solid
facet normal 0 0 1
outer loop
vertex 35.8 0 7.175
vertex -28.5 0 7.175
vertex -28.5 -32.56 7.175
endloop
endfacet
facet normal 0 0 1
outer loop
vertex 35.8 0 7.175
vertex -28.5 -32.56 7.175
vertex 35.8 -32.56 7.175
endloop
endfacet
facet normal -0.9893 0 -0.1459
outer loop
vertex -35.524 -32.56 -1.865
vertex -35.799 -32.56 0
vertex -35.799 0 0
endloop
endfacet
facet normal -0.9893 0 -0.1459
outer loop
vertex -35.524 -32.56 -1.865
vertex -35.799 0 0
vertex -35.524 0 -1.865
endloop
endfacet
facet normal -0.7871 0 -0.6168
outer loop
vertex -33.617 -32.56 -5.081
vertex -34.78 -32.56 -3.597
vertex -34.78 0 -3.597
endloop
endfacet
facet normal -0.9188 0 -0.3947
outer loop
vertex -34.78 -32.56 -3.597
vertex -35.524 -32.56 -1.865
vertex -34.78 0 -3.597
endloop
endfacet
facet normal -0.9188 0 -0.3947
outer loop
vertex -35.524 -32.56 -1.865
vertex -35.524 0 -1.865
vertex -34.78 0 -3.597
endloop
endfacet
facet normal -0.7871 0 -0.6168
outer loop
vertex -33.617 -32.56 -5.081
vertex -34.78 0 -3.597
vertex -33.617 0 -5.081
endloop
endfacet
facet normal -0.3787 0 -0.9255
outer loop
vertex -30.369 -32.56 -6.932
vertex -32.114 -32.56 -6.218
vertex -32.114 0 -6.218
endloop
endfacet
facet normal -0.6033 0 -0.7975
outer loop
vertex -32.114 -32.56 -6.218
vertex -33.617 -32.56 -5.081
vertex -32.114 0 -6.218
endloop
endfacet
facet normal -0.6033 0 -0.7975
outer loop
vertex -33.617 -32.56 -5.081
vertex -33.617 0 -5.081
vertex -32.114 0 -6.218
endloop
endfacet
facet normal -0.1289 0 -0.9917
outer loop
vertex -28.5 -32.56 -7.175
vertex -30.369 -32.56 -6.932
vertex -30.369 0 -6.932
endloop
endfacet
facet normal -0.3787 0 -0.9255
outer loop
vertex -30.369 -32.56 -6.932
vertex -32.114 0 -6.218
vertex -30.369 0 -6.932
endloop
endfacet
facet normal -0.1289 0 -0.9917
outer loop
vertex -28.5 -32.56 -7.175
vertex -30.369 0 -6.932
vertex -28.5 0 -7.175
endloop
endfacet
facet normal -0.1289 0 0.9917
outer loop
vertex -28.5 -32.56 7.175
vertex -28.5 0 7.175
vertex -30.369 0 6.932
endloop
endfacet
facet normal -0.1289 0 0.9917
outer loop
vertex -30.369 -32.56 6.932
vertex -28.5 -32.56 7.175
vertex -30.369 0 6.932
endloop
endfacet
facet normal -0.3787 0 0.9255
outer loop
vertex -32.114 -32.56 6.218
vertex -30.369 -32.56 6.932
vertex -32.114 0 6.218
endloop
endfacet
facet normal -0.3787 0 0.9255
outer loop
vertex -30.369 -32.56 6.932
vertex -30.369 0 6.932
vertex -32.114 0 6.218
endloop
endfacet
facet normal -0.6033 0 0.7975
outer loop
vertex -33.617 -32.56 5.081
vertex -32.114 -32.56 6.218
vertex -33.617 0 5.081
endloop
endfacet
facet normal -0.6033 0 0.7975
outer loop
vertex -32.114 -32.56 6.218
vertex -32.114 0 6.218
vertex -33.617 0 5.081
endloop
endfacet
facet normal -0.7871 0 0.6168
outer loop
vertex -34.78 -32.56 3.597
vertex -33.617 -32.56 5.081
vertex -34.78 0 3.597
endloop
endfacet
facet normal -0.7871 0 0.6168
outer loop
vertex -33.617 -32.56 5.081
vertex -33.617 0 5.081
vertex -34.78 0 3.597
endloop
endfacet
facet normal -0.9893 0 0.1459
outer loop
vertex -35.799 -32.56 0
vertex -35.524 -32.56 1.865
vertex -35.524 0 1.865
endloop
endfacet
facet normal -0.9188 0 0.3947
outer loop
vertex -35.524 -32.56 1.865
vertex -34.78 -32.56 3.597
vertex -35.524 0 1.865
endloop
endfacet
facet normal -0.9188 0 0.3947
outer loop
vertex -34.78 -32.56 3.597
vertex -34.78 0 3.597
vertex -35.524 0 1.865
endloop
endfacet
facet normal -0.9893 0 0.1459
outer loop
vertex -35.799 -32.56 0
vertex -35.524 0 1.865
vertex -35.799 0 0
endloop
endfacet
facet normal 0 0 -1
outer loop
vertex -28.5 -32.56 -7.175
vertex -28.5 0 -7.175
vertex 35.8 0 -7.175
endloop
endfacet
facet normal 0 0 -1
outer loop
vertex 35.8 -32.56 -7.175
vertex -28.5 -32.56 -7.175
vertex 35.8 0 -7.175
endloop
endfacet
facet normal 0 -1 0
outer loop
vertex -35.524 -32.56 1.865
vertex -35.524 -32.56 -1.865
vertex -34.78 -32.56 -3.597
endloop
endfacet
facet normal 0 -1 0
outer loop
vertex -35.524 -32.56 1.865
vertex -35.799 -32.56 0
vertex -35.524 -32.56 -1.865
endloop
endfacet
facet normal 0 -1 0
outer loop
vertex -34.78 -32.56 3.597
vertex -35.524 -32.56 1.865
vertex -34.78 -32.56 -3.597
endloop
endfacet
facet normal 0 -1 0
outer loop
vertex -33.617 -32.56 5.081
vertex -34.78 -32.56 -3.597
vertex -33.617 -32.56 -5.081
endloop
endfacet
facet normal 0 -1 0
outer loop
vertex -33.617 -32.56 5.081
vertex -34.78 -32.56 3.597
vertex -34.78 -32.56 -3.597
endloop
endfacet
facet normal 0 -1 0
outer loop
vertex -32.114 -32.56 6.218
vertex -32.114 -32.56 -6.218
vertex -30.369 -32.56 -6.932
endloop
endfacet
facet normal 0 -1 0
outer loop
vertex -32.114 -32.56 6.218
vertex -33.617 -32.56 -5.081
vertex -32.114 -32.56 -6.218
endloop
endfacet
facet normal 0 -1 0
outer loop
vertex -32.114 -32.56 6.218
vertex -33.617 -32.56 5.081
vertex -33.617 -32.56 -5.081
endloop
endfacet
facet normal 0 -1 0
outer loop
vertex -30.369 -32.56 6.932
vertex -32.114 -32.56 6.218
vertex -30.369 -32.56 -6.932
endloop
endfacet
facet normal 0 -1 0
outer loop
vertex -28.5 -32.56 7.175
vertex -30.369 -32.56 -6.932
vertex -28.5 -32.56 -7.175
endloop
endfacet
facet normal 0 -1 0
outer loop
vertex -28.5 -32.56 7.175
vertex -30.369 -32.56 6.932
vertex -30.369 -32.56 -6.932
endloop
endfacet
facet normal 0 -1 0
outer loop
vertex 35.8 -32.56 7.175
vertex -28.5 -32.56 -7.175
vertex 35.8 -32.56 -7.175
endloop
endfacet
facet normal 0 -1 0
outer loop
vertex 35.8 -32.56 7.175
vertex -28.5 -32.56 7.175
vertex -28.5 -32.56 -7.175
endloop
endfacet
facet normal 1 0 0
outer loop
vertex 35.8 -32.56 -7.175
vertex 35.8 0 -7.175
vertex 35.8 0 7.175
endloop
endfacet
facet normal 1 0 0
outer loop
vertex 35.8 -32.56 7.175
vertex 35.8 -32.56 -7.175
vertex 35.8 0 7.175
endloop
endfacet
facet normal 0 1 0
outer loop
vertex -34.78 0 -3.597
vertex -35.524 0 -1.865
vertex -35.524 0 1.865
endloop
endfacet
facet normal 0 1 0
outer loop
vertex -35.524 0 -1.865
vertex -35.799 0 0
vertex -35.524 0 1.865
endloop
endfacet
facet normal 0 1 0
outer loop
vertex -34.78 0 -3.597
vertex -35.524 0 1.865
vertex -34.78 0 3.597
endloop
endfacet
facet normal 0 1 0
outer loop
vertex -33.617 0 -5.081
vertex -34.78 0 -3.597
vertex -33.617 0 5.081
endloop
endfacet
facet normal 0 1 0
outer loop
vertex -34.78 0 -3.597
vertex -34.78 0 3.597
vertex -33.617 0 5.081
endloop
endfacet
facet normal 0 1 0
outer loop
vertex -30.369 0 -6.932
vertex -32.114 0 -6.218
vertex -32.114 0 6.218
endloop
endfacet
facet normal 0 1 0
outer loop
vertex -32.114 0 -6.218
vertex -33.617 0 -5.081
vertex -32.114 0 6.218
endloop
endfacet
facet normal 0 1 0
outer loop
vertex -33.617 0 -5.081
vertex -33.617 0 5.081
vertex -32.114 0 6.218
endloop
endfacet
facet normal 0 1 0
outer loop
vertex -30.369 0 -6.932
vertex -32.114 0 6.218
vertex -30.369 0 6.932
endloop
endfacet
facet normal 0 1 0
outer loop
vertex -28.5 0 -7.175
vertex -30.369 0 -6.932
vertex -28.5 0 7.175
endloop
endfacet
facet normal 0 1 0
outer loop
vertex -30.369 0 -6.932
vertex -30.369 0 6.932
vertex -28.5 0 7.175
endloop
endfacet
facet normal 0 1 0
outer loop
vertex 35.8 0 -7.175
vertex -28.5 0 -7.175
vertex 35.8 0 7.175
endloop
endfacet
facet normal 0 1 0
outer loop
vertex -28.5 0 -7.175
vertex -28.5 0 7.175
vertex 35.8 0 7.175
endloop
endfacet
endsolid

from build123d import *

# Parameters (mm, degrees)
F0_W        = 71.6
F0_H        = 14.35
F1_DEPTH    = 32.56
F2_T1_DEPTH = 69.06


# Not quite as in the source:
# - a fillet or chamfer that OpenCascade refuses, or shapes differently, is made with other operations: its cross-section is extruded or revolved along the edge and cut away or added


with BuildPart() as f1:
    # F0 (on Front) → F1 (new body)
    with BuildSketch(Plane.XZ):
        Rectangle(F0_W, F0_H)
    extrude(amount=F1_DEPTH)

    # F2: fillet of radius 7.3 on 2 edges, made by hand

    # F2_s2 → F2_t1 (cut)
    with BuildSketch(Plane.XZ.offset(-18.25)):
        with BuildLine():
            ThreePointArc((-28.5, 7.175), (-33.6618795027, 5.0368795027), (-35.8, -0.125))
            Line((-35.8, -0.125), (-35.8, 7.175))
            Line((-35.8, 7.175), (-28.5, 7.175))
        make_face()
        with BuildLine():
            ThreePointArc((-35.8, 0.125), (-33.6618795027, -5.0368795027), (-28.5, -7.175))
            Line((-28.5, -7.175), (-35.8, -7.175))
            Line((-35.8, -7.175), (-35.8, 0.125))
        make_face()
    extrude(amount=F2_T1_DEPTH, mode=Mode.SUBTRACT)


solid = f1.part
